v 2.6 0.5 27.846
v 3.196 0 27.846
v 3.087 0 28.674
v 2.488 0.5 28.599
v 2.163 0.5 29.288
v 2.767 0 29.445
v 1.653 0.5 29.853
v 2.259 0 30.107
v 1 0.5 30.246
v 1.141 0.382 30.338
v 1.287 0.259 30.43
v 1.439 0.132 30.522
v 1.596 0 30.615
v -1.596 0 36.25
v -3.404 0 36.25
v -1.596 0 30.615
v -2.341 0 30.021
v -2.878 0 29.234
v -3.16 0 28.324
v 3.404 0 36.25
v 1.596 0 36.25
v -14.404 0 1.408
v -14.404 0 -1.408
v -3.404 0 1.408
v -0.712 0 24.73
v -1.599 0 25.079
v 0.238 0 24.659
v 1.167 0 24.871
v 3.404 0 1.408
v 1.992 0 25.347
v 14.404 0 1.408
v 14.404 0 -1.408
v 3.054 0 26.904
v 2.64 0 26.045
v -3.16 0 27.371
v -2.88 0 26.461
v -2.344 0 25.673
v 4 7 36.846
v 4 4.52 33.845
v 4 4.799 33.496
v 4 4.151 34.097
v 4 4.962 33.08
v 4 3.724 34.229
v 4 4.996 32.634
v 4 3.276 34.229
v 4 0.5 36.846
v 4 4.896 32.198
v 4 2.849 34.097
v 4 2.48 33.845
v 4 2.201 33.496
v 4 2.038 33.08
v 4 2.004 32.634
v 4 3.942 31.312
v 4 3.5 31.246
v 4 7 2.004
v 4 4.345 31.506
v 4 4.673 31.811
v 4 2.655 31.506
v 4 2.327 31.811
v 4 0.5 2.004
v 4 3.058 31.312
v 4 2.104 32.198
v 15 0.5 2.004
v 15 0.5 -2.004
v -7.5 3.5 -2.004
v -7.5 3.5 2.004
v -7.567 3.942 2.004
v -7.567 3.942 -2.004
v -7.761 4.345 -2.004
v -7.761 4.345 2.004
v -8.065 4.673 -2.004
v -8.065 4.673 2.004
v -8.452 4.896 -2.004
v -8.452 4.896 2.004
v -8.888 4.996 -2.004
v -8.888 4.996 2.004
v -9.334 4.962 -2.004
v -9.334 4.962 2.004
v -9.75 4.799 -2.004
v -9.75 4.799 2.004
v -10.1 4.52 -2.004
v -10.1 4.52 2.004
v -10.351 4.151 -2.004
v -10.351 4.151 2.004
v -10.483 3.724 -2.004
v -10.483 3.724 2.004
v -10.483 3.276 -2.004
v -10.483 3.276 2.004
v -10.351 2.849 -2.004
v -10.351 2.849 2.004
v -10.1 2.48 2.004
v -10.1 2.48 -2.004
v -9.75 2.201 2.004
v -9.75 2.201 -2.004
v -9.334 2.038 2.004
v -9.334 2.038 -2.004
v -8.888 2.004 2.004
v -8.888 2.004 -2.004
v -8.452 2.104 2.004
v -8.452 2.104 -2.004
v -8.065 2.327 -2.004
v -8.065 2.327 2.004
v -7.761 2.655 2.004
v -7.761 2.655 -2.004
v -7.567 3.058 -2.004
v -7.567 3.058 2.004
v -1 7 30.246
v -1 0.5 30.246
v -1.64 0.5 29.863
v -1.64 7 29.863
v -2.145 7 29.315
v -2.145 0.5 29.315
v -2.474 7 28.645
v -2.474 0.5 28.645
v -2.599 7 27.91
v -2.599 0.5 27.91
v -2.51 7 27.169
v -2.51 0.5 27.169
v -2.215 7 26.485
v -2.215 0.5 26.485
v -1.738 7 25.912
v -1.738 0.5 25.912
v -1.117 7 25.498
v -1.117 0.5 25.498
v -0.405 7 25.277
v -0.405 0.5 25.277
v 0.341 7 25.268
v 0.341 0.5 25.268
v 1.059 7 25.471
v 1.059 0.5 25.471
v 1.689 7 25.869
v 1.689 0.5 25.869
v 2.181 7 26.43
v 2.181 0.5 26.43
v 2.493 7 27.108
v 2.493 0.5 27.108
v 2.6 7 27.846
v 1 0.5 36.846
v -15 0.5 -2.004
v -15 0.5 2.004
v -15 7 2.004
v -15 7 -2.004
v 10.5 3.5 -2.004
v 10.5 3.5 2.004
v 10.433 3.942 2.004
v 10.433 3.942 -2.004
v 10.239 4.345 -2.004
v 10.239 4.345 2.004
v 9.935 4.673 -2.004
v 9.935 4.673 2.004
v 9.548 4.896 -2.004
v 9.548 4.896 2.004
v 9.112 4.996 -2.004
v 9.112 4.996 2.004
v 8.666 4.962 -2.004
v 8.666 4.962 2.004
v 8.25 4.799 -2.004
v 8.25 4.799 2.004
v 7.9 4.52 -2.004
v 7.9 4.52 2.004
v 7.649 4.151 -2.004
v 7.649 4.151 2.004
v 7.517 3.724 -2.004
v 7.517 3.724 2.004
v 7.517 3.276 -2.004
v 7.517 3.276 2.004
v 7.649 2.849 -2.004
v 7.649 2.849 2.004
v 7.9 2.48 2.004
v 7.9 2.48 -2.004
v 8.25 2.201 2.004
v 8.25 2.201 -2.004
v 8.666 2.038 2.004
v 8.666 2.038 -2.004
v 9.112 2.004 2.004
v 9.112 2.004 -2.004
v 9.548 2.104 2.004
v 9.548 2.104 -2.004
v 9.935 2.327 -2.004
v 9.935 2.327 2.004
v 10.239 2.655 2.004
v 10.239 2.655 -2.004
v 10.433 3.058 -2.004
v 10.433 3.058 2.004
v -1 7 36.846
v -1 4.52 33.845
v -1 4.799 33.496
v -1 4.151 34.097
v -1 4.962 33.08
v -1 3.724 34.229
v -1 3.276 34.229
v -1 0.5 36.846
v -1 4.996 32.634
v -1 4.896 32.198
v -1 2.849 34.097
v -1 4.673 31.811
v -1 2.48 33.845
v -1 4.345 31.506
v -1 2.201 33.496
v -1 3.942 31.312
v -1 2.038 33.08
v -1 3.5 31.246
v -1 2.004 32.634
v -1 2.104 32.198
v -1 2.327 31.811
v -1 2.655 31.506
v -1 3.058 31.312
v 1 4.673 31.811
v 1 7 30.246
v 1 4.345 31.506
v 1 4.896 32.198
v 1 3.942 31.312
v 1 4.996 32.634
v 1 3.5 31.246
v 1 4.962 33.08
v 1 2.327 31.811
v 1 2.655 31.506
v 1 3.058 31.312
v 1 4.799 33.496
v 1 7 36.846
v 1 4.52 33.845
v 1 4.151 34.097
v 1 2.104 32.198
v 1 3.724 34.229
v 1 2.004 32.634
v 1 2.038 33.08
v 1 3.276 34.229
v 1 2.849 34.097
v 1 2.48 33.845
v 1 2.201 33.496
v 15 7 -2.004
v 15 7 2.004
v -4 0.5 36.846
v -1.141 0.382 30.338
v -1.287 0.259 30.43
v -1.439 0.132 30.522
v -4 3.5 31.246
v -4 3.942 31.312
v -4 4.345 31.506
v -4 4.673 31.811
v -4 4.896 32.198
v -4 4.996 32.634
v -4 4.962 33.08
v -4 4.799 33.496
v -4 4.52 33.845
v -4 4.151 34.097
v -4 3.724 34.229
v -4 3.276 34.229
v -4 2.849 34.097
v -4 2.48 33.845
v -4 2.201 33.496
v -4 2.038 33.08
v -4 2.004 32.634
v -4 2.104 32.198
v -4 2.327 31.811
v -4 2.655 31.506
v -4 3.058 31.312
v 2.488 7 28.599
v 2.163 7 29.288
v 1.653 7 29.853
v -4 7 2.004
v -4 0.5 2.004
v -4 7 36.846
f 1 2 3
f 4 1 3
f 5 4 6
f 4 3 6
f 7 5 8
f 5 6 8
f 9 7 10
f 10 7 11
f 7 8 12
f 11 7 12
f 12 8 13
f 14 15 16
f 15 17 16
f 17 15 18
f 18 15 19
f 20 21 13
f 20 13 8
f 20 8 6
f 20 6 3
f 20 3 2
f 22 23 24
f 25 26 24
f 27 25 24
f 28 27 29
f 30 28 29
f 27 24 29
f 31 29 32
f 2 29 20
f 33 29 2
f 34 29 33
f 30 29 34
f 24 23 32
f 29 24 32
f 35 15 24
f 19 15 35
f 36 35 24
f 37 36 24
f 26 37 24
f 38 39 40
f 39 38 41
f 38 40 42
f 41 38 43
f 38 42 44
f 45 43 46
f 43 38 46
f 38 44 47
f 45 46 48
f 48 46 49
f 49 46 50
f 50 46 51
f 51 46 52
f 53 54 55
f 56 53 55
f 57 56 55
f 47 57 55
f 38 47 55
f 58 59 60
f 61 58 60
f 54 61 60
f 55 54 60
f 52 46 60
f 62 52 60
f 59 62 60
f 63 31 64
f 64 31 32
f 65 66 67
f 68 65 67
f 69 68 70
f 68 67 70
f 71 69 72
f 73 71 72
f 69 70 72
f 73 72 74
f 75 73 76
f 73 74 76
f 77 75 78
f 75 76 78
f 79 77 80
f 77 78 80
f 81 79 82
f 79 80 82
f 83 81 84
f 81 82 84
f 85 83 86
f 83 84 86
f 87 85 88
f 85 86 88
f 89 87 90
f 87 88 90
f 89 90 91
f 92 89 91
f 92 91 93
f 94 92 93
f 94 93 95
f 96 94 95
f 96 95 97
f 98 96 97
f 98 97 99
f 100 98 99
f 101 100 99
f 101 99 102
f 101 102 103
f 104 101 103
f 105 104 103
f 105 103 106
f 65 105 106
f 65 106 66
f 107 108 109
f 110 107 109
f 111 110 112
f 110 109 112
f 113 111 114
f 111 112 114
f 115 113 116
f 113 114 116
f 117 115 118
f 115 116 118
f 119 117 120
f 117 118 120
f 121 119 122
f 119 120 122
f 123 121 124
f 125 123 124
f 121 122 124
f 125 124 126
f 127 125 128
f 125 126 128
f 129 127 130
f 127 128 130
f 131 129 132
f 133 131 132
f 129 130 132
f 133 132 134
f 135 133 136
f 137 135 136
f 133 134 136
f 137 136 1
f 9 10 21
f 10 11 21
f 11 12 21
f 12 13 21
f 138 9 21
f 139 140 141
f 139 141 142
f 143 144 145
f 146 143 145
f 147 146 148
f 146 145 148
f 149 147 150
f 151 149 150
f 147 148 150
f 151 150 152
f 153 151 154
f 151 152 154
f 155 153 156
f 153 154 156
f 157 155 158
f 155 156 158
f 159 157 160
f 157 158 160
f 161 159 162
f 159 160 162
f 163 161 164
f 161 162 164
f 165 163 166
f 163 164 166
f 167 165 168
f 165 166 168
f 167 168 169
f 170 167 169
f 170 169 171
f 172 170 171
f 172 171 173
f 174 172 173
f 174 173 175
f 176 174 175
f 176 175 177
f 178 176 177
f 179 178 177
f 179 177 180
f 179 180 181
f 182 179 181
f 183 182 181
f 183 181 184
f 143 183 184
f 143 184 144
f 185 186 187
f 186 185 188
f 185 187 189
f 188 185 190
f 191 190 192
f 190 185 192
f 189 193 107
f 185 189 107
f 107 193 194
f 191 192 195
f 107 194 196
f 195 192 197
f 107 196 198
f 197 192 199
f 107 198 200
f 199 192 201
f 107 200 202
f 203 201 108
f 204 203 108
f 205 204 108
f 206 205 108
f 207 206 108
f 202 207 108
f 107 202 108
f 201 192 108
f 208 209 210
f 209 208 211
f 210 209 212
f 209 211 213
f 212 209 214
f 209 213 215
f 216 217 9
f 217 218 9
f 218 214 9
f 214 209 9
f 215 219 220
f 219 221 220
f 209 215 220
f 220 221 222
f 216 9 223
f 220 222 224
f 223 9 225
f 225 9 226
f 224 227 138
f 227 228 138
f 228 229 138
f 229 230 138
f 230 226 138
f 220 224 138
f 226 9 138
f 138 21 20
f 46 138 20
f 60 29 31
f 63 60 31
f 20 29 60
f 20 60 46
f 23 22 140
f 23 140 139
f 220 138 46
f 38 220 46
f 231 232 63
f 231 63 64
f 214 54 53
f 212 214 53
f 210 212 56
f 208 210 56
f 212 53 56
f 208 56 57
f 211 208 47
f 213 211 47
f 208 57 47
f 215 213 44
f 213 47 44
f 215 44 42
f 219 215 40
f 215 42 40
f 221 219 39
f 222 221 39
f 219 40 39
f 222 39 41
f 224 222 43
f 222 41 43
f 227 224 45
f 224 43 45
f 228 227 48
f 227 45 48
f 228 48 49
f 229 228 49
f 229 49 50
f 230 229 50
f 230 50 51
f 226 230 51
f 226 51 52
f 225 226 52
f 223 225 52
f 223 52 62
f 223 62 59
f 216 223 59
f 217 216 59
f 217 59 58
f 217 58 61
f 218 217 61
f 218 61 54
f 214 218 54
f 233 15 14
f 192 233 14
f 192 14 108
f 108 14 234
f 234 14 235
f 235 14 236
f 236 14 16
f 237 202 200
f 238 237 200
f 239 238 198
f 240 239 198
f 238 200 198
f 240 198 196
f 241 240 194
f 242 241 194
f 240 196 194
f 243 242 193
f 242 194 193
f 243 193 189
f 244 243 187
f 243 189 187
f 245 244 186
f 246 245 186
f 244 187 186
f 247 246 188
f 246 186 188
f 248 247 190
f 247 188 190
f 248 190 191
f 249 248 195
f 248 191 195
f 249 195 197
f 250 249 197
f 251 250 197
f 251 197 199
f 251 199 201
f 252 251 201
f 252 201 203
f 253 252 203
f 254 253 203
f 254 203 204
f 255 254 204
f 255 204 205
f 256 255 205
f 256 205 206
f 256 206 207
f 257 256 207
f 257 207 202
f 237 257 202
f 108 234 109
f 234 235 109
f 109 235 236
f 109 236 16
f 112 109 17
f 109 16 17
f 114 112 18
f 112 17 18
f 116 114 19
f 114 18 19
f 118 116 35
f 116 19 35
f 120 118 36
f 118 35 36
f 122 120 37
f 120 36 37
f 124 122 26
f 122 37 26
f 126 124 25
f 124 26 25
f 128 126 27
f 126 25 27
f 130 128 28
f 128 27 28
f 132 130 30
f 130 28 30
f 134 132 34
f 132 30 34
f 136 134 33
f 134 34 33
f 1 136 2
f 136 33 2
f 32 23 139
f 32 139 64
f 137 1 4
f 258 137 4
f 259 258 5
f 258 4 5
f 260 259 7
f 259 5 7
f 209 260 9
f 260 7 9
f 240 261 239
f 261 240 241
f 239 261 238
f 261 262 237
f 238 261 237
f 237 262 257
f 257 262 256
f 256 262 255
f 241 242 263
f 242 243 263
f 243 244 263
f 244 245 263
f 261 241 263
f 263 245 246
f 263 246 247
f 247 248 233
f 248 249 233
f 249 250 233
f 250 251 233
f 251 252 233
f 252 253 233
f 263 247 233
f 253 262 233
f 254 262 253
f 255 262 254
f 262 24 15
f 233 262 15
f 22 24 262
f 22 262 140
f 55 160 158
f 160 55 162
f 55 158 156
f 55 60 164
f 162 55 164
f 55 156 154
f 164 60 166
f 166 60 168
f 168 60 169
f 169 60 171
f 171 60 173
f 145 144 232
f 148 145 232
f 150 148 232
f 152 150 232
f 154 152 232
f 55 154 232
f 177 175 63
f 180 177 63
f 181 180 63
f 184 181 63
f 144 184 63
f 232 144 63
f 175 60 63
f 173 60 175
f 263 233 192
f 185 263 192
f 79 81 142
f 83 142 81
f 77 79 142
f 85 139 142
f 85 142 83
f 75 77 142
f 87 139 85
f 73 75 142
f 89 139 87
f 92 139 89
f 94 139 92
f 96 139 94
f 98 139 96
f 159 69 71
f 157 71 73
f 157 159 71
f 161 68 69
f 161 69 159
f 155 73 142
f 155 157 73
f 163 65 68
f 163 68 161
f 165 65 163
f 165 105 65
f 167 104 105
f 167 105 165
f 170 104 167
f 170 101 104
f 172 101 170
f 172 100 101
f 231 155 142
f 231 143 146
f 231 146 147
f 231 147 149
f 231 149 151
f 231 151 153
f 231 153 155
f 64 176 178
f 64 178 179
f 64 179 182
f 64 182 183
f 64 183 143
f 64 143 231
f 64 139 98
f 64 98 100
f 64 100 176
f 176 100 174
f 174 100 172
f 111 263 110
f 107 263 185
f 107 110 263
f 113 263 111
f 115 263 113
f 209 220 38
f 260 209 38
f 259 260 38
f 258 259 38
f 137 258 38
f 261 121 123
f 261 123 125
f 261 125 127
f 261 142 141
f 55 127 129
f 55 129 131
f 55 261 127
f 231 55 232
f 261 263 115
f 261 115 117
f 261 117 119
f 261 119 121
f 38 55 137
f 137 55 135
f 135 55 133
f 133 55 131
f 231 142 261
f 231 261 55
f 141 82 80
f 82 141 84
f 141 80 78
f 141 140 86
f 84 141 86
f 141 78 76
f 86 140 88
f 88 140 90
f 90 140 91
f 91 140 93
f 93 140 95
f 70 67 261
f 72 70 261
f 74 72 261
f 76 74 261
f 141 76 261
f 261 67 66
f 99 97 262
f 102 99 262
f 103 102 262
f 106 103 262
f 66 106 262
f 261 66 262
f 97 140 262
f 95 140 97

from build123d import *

# Parameters (mm, degrees)
SKETCH1_W              = 30
SKETCH1_H              = 4.008403362
BOSS_EXTRUDE1_DEPTH    = 7
SKETCH2_R              = 1.5
CUT_EXTRUDE1_DEPTH     = 20
SKETCH3_R              = 1.5
CUT_EXTRUDE2_DEPTH     = 5
CHAMFER1_SIZE          = 0.5
CHAMFER1_SIZE2         = 0.595876796
CHAMFER1_PART_2_SIZE   = 0.5
CHAMFER1_PART_2_SIZE2  = 0.595876796
CHAMFER1_PART_3_SIZE   = 0.5
CHAMFER1_PART_3_SIZE2  = 0.595876796
CHAMFER1_PART_4_SIZE   = 0.5
CHAMFER1_PART_4_SIZE2  = 0.595876796
CHAMFER1_PART_5_SIZE   = 0.5
CHAMFER1_PART_5_SIZE2  = 0.595876796
CHAMFER1_PART_6_SIZE   = 0.5
CHAMFER1_PART_6_SIZE2  = 0.595876796
CHAMFER1_PART_7_SIZE   = 0.5
CHAMFER1_PART_7_SIZE2  = 0.595876796
CHAMFER1_PART_8_SIZE   = 0.5
CHAMFER1_PART_8_SIZE2  = 0.595876796
CHAMFER1_PART_9_SIZE   = 0.5
CHAMFER1_PART_9_SIZE2  = 0.595876796
CHAMFER1_PART_10_SIZE  = 0.5
CHAMFER1_PART_10_SIZE2 = 0.595876796
CHAMFER1_PART_11_SIZE  = 0.5
CHAMFER1_PART_11_SIZE2 = 0.595876796
CHAMFER1_PART_12_SIZE  = 0.5
CHAMFER1_PART_12_SIZE2 = 0.595876796


with BuildPart() as part:
    # Sketch1 → Boss-Extrude1 (new body)
    with BuildSketch(Plane(origin=(0, 0, 0), x_dir=(1, 0, 0), z_dir=(0, 1, 0))):
        with BuildLine():
            Line((4, -2.004201681), (-4, -2.004201681))
            Line((-4, -2.004201681), (-4, -36.845798319))
            Line((-4, -36.845798319), (-1, -36.845798319))
            Line((-1, -36.845798319), (-1, -30.245798319))
            ThreePointArc((-1, -30.245798319), (-1.44222051, -25.682467554), (2.6, -27.845798319))
            ThreePointArc((2.6, -27.845798319), (2.163330765, -29.28801883), (1, -30.245798319))
            Line((1, -30.245798319), (1, -36.845798319))
            Line((1, -36.845798319), (4, -36.845798319))
            Line((4, -36.845798319), (4, -2.004201681))
        make_face()
        Rectangle(SKETCH1_W, SKETCH1_H)
    extrude(amount=BOSS_EXTRUDE1_DEPTH)

    # Sketch2 → Cut-Extrude1 (cut, through all)
    with BuildSketch(Plane(origin=(4, 0, 0), x_dir=(0, 0, -1), z_dir=(1, 0, 0))):
        with Locations((-32.745798319, 3.5)):
            Circle(SKETCH2_R)
    extrude(amount=-CUT_EXTRUDE1_DEPTH, mode=Mode.SUBTRACT)

    # Sketch3 → Cut-Extrude2 (cut)
    with BuildSketch(Plane.XY.offset(2.004201681)):
        with Locations((9, 3.5)):
            Circle(SKETCH3_R)
        with Locations((-9, 3.5)):
            Circle(SKETCH3_R)
    extrude(amount=-CUT_EXTRUDE2_DEPTH, mode=Mode.SUBTRACT)

    # Chamfer1
    chamfer1_edges = [part.edges().sort_by_distance(p)[0] for p in [
        (-1, 0, 33.545798319),
    ]]
    chamfer1_side = [part.faces().sort_by_distance(p)[0] for p in [
        (-1, 3.5, 36.749590212),
    ]]
    chamfer(chamfer1_edges, length=CHAMFER1_SIZE, length2=CHAMFER1_SIZE2, reference=chamfer1_side[0])

    # Chamfer1 part 2
    chamfer1_part_2_edges = [part.edges().sort_by_distance(p)[0] for p in [
        (-2.5, 0, 36.845798319),
    ]]
    chamfer1_part_2_side = [part.faces().sort_by_distance(p)[0] for p in [
        (-2.5, 3.5, 36.845798319),
    ]]
    chamfer(chamfer1_part_2_edges, length=CHAMFER1_PART_2_SIZE, length2=CHAMFER1_PART_2_SIZE2, reference=chamfer1_part_2_side[0])

    # Chamfer1 part 3
    chamfer1_part_3_edges = [part.edges().sort_by_distance(p)[0] for p in [
        (-4, 0, 19.425),
    ]]
    chamfer1_part_3_side = [part.faces().sort_by_distance(p)[0] for p in [
        (-4, 3.5, 19.027406284),
    ]]
    chamfer(chamfer1_part_3_edges, length=CHAMFER1_PART_3_SIZE, length2=CHAMFER1_PART_3_SIZE2, reference=chamfer1_part_3_side[0])

    # Chamfer1 part 4
    chamfer1_part_4_edges = [part.edges().sort_by_distance(p)[0] for p in [
        (-9.5, 0, 2.004201681),
    ]]
    chamfer1_part_4_side = [part.faces().sort_by_distance(p)[0] for p in [
        (-9.5, 0.130384048, 2.004201681),
    ]]
    chamfer(chamfer1_part_4_edges, length=CHAMFER1_PART_4_SIZE, length2=CHAMFER1_PART_4_SIZE2, reference=chamfer1_part_4_side[0])

    # Chamfer1 part 5
    chamfer1_part_5_edges = [part.edges().sort_by_distance(p)[0] for p in [
        (-15, 0, 0),
    ]]
    chamfer1_part_5_side = [part.faces().sort_by_distance(p)[0] for p in [
        (-15, 3.5, 0),
    ]]
    chamfer(chamfer1_part_5_edges, length=CHAMFER1_PART_5_SIZE, length2=CHAMFER1_PART_5_SIZE2, reference=chamfer1_part_5_side[0])

    # Chamfer1 part 6
    chamfer1_part_6_edges = [part.edges().sort_by_distance(p)[0] for p in [
        (0, 0, -2.004201681),
    ]]
    chamfer1_part_6_side = [part.faces().sort_by_distance(p)[0] for p in [
        (0, 3.5, -2.004201681),
    ]]
    chamfer(chamfer1_part_6_edges, length=CHAMFER1_PART_6_SIZE, length2=CHAMFER1_PART_6_SIZE2, reference=chamfer1_part_6_side[0])

    # Chamfer1 part 7
    chamfer1_part_7_edges = [part.edges().sort_by_distance(p)[0] for p in [
        (15, 0, 0),
    ]]
    chamfer1_part_7_side = [part.faces().sort_by_distance(p)[0] for p in [
        (15, 3.5, 0),
    ]]
    chamfer(chamfer1_part_7_edges, length=CHAMFER1_PART_7_SIZE, length2=CHAMFER1_PART_7_SIZE2, reference=chamfer1_part_7_side[0])

    # Chamfer1 part 8
    chamfer1_part_8_edges = [part.edges().sort_by_distance(p)[0] for p in [
        (9.5, 0, 2.004201681),
    ]]
    chamfer1_part_8_side = [part.faces().sort_by_distance(p)[0] for p in [
        (9.5, 0.130384048, 2.004201681),
    ]]
    chamfer(chamfer1_part_8_edges, length=CHAMFER1_PART_8_SIZE, length2=CHAMFER1_PART_8_SIZE2, reference=chamfer1_part_8_side[0])

    # Chamfer1 part 9
    chamfer1_part_9_edges = [part.edges().sort_by_distance(p)[0] for p in [
        (4, 0, 19.425),
    ]]
    chamfer1_part_9_side = [part.faces().sort_by_distance(p)[0] for p in [
        (4, 3.5, 19.027406284),
    ]]
    chamfer(chamfer1_part_9_edges, length=CHAMFER1_PART_9_SIZE, length2=CHAMFER1_PART_9_SIZE2, reference=chamfer1_part_9_side[0])

    # Chamfer1 part 10
    chamfer1_part_10_edges = [part.edges().sort_by_distance(p)[0] for p in [
        (2.5, 0, 36.845798319),
    ]]
    chamfer1_part_10_side = [part.faces().sort_by_distance(p)[0] for p in [
        (2.5, 3.5, 36.845798319),
    ]]
    chamfer(chamfer1_part_10_edges, length=CHAMFER1_PART_10_SIZE, length2=CHAMFER1_PART_10_SIZE2, reference=chamfer1_part_10_side[0])

    # Chamfer1 part 11
    chamfer1_part_11_edges = [part.edges().sort_by_distance(p)[0] for p in [
        (1, 0, 33.545798319),
    ]]
    chamfer1_part_11_side = [part.faces().sort_by_distance(p)[0] for p in [
        (1, 3.5, 30.342006427),
    ]]
    chamfer(chamfer1_part_11_edges, length=CHAMFER1_PART_11_SIZE, length2=CHAMFER1_PART_11_SIZE2, reference=chamfer1_part_11_side[0])

    # Chamfer1 part 12
    chamfer1_part_12_edges = [part.edges().sort_by_distance(p)[0] for p in [
        (-1.44222051, 0, 25.682467554),
    ]]
    chamfer1_part_12_side = [part.faces().sort_by_distance(p)[0] for p in [
        (-1.44222051, 3.5, 25.682467554),
    ]]
    chamfer(chamfer1_part_12_edges, length=CHAMFER1_PART_12_SIZE, length2=CHAMFER1_PART_12_SIZE2, reference=chamfer1_part_12_side[0])


solid = part.part
